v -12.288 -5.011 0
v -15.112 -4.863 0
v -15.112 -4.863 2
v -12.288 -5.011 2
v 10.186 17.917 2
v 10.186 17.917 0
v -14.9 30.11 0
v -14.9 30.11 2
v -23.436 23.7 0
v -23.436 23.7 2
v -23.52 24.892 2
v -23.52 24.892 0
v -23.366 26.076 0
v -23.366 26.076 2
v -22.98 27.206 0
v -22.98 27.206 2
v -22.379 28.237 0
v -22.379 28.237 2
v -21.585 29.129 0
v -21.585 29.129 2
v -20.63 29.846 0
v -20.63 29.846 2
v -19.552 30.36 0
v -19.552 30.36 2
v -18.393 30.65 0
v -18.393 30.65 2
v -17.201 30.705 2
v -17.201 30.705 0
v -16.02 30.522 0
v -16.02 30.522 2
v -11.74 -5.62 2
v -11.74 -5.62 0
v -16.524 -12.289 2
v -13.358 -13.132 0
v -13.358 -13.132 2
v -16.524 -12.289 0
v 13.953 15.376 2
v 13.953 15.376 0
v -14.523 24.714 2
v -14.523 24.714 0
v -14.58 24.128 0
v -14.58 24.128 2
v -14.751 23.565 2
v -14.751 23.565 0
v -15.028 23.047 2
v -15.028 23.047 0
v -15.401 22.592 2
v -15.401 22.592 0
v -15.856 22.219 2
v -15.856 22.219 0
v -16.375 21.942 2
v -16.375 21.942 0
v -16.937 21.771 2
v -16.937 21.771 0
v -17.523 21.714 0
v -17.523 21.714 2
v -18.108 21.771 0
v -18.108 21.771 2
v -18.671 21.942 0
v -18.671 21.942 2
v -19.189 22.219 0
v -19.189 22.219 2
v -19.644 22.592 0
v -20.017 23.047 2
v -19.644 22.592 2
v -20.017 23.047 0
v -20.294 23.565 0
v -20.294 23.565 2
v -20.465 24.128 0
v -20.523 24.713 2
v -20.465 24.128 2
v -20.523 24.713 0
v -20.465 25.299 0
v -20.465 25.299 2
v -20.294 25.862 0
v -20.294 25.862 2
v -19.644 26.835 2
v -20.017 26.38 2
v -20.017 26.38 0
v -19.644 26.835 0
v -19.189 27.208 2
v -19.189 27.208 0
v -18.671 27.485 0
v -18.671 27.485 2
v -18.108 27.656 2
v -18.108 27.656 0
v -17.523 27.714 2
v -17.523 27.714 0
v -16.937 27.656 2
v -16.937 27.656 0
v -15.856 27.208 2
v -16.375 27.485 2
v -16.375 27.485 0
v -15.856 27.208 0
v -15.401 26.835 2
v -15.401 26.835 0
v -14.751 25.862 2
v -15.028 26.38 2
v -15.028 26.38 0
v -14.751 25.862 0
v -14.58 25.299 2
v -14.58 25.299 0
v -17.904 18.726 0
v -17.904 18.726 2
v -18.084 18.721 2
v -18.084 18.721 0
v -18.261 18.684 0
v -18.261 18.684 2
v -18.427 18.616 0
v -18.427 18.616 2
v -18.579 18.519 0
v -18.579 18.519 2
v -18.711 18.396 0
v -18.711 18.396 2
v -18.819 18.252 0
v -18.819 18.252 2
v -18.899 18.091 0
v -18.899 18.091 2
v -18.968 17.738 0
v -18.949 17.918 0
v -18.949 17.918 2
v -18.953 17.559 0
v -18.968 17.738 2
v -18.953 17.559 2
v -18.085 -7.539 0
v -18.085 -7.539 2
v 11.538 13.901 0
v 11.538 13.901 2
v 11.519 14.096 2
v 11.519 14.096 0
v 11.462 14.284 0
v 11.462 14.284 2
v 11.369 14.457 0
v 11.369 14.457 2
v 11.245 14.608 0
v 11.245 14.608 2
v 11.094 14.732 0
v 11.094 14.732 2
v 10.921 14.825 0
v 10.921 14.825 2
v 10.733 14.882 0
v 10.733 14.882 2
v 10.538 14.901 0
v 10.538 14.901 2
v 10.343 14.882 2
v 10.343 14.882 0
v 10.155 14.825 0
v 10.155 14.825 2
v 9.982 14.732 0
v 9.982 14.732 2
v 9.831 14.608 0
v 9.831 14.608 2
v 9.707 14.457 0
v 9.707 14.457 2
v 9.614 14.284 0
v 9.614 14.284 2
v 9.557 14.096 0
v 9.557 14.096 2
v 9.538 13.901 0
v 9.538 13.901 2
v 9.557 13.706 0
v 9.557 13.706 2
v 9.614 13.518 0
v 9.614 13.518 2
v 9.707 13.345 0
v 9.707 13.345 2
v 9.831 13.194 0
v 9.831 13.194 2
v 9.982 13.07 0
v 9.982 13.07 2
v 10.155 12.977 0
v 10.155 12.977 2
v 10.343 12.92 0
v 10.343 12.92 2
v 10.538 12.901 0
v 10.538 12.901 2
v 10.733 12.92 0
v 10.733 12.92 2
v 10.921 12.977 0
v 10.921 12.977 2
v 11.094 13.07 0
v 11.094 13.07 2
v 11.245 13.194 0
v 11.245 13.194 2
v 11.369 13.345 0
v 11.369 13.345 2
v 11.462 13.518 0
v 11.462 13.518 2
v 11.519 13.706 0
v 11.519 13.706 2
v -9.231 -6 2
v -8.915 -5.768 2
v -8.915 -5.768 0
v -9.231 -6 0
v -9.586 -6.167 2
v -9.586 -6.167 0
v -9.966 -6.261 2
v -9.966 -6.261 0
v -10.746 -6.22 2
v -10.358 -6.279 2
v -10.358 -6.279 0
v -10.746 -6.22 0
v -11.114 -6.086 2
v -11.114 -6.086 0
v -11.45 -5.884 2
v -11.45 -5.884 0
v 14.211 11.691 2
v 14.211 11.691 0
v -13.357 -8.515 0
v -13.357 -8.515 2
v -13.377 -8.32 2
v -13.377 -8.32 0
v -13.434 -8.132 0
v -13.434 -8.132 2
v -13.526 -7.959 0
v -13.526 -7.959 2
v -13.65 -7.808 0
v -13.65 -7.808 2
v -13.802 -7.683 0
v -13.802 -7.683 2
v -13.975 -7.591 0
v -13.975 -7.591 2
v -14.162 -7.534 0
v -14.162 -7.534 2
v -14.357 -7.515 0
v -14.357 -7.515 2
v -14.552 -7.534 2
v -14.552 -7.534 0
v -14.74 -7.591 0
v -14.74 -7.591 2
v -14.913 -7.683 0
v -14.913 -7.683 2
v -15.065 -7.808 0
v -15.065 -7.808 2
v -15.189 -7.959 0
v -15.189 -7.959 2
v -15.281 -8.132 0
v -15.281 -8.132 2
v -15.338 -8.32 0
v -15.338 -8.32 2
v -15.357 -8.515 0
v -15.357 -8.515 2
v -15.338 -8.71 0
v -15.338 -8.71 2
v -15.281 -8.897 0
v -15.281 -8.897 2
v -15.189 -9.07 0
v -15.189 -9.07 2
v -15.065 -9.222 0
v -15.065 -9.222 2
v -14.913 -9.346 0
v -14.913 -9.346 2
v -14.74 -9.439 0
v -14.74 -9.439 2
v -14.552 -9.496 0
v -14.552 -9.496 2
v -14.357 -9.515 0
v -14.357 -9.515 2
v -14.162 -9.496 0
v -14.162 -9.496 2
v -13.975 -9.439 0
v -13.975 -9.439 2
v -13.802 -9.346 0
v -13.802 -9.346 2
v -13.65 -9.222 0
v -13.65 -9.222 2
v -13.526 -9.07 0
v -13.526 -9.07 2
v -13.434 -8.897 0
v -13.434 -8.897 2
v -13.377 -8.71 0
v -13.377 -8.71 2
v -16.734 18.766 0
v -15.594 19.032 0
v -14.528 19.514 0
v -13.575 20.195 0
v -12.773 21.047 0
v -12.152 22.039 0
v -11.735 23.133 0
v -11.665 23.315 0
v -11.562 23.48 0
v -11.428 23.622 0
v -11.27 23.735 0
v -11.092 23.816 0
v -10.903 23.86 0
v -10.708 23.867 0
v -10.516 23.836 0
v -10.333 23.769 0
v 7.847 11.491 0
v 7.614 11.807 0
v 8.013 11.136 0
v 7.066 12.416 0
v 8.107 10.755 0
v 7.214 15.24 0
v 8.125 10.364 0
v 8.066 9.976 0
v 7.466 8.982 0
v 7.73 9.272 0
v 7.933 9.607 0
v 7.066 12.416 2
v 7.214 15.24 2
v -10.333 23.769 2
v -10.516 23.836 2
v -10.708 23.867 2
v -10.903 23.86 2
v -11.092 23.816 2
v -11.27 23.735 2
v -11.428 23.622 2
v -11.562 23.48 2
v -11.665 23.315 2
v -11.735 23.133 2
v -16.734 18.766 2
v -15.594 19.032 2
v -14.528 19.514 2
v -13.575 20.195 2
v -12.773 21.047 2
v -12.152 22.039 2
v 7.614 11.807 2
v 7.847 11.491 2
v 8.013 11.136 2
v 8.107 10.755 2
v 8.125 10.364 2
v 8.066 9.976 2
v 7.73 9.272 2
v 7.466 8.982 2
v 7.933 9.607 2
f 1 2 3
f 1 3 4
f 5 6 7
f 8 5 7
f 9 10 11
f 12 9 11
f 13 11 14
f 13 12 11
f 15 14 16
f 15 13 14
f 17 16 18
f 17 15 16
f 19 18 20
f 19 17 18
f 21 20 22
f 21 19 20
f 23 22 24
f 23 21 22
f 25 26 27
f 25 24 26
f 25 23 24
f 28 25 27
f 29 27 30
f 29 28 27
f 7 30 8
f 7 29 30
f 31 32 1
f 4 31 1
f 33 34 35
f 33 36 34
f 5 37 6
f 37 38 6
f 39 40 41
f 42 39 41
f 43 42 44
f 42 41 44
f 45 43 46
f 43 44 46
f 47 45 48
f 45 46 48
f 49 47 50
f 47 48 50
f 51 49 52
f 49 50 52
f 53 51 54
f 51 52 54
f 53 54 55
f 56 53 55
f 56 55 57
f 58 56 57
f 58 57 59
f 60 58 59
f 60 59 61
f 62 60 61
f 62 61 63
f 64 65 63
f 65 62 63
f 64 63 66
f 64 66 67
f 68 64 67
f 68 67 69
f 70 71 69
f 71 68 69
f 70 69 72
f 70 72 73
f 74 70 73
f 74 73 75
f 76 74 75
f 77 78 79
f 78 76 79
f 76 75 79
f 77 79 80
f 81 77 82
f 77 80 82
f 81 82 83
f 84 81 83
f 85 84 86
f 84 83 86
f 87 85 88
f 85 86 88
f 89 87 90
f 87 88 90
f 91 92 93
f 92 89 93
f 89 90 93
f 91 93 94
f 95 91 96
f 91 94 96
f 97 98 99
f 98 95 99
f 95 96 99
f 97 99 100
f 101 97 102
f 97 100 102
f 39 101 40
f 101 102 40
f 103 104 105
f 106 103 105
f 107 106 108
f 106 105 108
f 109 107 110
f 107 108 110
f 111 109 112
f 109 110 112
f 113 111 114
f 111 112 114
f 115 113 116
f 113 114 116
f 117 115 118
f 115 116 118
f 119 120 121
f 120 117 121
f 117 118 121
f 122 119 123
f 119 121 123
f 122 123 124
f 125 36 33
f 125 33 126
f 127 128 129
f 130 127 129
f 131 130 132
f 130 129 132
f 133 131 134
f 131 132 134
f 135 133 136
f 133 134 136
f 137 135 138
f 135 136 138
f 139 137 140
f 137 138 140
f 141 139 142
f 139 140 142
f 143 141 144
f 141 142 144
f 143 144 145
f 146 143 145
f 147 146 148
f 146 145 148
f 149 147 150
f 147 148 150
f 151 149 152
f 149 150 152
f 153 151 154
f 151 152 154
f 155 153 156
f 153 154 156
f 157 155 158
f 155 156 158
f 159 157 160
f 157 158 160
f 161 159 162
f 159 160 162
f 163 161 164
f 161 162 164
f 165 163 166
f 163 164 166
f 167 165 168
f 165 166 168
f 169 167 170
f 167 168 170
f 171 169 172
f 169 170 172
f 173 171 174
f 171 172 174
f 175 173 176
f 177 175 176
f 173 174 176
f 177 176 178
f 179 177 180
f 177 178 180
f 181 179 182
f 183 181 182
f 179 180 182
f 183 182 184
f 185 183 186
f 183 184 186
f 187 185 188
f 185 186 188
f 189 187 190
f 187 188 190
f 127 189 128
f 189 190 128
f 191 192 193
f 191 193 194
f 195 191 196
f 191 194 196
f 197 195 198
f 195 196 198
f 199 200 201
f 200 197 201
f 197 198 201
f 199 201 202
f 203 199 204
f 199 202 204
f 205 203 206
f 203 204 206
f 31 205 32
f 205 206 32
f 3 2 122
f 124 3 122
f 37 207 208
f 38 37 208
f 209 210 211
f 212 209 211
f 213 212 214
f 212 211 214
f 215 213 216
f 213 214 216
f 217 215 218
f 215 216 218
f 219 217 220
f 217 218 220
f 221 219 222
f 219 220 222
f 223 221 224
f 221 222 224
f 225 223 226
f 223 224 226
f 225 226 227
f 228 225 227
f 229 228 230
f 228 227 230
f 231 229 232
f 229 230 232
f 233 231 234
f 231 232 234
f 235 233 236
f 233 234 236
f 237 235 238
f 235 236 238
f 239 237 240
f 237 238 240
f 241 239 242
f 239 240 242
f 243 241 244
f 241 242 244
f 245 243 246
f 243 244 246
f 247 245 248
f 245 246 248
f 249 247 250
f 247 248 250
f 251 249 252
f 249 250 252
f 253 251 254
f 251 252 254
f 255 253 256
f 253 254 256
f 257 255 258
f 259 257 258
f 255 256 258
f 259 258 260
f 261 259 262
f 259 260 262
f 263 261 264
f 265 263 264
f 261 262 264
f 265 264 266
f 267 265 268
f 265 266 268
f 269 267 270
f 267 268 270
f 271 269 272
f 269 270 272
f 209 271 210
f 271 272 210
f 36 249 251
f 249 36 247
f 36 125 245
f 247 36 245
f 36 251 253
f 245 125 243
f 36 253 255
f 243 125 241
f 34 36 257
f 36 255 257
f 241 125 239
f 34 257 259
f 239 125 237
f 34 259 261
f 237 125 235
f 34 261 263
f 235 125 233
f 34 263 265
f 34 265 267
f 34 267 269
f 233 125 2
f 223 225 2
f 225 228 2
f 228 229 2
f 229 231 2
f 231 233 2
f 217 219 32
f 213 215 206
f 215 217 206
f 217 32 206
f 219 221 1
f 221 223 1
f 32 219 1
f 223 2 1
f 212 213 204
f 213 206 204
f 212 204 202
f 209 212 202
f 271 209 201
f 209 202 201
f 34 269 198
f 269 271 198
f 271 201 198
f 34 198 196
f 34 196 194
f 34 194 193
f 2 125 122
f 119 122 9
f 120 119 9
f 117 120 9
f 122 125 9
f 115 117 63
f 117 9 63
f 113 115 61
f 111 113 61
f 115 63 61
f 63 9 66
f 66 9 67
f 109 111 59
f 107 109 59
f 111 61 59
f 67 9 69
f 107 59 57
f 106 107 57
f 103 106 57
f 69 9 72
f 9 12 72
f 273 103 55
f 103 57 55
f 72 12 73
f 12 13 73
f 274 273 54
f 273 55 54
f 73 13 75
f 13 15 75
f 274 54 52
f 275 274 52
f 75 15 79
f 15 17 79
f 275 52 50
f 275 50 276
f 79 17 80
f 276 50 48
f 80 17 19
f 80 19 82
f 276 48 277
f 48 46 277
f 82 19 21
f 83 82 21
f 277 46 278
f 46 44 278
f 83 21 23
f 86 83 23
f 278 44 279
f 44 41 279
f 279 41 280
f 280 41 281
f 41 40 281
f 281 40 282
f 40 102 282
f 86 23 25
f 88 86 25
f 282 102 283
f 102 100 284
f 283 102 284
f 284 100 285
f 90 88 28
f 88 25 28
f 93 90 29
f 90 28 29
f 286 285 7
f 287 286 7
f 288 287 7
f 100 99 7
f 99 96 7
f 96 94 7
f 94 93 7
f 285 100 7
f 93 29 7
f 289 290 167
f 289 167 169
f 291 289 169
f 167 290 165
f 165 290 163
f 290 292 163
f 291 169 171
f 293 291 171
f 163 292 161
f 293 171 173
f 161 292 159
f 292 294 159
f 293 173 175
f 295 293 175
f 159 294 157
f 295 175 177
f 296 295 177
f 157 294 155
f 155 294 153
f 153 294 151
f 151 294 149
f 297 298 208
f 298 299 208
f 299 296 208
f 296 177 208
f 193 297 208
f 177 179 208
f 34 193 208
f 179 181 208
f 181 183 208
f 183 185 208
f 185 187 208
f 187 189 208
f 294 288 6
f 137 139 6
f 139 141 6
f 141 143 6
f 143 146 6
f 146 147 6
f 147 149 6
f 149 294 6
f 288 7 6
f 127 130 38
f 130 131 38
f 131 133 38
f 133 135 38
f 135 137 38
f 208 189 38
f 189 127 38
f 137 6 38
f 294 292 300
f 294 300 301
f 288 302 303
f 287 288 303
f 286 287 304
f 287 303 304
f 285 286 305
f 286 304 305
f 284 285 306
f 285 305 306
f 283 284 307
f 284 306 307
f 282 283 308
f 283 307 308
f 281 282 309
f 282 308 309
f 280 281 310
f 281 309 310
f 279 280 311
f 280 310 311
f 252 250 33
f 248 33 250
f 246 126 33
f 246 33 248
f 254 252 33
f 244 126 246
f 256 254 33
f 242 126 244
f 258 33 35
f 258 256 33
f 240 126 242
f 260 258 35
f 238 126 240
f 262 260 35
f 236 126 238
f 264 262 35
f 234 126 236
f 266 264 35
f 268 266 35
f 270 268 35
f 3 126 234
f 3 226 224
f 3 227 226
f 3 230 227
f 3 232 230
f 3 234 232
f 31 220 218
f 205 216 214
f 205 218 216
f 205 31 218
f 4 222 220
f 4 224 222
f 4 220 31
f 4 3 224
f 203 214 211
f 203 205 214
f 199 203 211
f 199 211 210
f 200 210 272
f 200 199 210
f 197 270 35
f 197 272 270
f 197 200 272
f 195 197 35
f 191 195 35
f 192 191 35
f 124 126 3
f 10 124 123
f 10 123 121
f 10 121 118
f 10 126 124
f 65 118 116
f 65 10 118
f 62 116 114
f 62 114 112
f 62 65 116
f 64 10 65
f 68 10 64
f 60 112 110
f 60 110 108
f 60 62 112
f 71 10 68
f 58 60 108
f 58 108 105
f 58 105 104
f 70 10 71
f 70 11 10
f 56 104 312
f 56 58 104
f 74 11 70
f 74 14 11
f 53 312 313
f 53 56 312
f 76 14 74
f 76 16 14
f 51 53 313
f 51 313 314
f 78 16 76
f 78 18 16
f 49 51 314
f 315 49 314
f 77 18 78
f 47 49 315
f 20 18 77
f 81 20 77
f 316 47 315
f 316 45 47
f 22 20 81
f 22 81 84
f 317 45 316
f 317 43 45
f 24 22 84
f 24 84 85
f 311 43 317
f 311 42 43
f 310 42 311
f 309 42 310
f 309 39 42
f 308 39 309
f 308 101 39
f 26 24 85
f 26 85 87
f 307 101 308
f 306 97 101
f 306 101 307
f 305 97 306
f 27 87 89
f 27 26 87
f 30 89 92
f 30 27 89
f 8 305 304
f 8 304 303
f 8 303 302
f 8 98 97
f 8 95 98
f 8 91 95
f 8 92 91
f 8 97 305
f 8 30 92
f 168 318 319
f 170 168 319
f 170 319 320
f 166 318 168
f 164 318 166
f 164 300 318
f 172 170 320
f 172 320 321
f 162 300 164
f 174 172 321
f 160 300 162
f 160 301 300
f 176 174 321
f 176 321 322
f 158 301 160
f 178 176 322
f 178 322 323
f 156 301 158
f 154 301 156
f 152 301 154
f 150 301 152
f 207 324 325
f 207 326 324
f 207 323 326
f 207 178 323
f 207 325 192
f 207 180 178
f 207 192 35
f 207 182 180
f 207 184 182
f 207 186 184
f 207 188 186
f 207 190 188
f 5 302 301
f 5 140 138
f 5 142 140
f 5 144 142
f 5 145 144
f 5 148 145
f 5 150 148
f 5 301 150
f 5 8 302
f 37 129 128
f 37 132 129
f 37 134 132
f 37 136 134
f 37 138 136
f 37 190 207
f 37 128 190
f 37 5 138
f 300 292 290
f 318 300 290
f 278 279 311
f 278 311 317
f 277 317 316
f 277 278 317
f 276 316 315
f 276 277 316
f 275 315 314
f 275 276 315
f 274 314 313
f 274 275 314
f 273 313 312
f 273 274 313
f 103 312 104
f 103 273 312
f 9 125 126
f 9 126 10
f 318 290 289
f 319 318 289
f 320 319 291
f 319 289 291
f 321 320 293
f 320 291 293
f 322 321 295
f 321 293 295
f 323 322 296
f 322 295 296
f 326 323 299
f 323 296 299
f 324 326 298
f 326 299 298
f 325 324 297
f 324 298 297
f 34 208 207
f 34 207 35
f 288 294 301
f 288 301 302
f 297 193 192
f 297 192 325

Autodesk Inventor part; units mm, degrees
ref_plane "YZ Plane" through (0, 0, 0) normal (1, 0, 0) x (0, 1, 0)
ref_plane "XZ Plane" through (0, 0, 0) normal (0, 1, 0) x (-1, 0, 0)
ref_plane "XY Plane" through (0, 0, 0) normal (0, 0, 1) x (1, 0, 0)
sketch "Sketch1" plane through (0, 0, 0) normal (0, 0, 1) x (1, 0, 0)
  circle A0 centre (10.538, 13.901) radius 1.5 projected
  circle A1 centre (-14.3574, -8.5148) radius 1.5 projected
  line L0 (-15.1125, -4.8626) -> (-12.2879, -5.0107) projected
  line L1 (-15.1125, -4.8626) -> (-18.0851, -7.5392) projected
  line L2 (-15.5871, -15.1392) -> (-18.0851, -7.5392) projected
  line L3 (16.4403, 13.6984) -> (-15.5871, -15.1392) projected
  line L4 (16.4403, 13.6984) -> (10.1865, 17.9166) projected
  line L5 (10.1865, 17.9166) -> (7.2139, 15.2401) projected
  line L6 (7.0659, 12.4156) -> (7.2139, 15.2401) projected
  line L7 (7.0659, 12.4156) -> (7.6141, 11.8066) projected
  arc A2 (7.4661, 8.9821) -> (7.6141, 11.8066) centre (6.1278, 10.4684) ccw projected
  line L8 (-8.9151, -5.7676) -> (7.4661, 8.9821) projected
  arc A3 (-11.7396, -5.6196) -> (-8.9151, -5.7676) centre (-10.2534, -4.2813) ccw projected
  line L9 (-11.7396, -5.6196) -> (-12.2879, -5.0107) projected
  circle A4 centre (-17.5227, 24.7135) radius 1.5 projected
  circle A5 centre (-17.5227, 24.7135) radius 3
  circle A6 centre (-17.5227, 24.7135) radius 6
  line L10 (-18.0851, -7.5392) -> (-23.4365, 23.7005)
  line L11 (10.1865, 17.9166) -> (-14.8998, 30.1099)
  line L12 (-15.1125, -4.8626) -> (-19.1917, 18.9503)
  line L13 (7.2139, 15.2401) -> (-11.5335, 24.3523)
  point P0 (0, 0)
  dimension "d0" = 6
  dimension "d1" = 12
extrude "Extrusion1" add sketch "Sketch1" along normal blind 2 contours L0 L9 A3 L8 A2 L7 L6 L5 L4 L3 L2 L1 | L1 L10 A6 L12 | A6 | A6 L11 L5 L13
chamfer "Chamfer1" distance 3 angle 45 2 edges at (16.4403, 13.6984, 1) (-15.5871, -15.1392, 1)
sketch "Sketch2" plane through (0, 0, 2) normal (0, 0, 1) x (1, 0, 0)
  line L0 (-13.3576, -13.1318) -> (-16.5238, -12.2892) projected
  line L1 (-13.3576, -13.1318) -> (14.2108, 11.691) projected
  line L2 (13.9532, 15.376) -> (14.2108, 11.691) projected
  line L3 (13.9532, 15.376) -> (10.1865, 17.9166) projected
  line L4 (10.1865, 17.9166) -> (-14.8998, 30.1099) projected
  arc A0 (-14.8998, 30.1099) -> (-23.4365, 23.7005) centre (-17.5227, 24.7135) ccw projected
  line L5 (-23.4365, 23.7005) -> (-18.0851, -7.5392) projected
  line L6 (-18.0851, -7.5392) -> (-16.5238, -12.2892) projected
  circle A1 centre (-17.5227, 24.7135) radius 3 projected
  circle A2 centre (10.538, 13.901) radius 1.5 projected
  circle A3 centre (-14.3574, -8.5148) radius 1.5 projected
  line L7 (-15.1125, -4.8626) -> (-19.1917, 18.9503) projected
  arc A4 (-19.1917, 18.9503) -> (-11.5335, 24.3523) centre (-17.5227, 24.7135) ccw projected
  line L8 (-11.5335, 24.3523) -> (7.2139, 15.2401) projected
  line L9 (7.2139, 15.2401) -> (7.0659, 12.4156) projected
  line L10 (7.0659, 12.4156) -> (7.6141, 11.8066) projected
  arc A5 (7.4661, 8.9821) -> (7.6141, 11.8066) centre (6.1278, 10.4684) ccw projected
  line L11 (7.4661, 8.9821) -> (-8.9151, -5.7676) projected
  arc A6 (-11.7396, -5.6196) -> (-8.9151, -5.7676) centre (-10.2534, -4.2813) ccw projected
  line L12 (-11.7396, -5.6196) -> (-12.2879, -5.0107) projected
  line L13 (-12.2879, -5.0107) -> (-15.1125, -4.8626) projected
  circle A7 centre (-14.3574, -8.5148) radius 1.5 projected
  circle A8 centre (-14.3574, -8.5148) radius 1
  circle A9 centre (10.538, 13.901) radius 1
  point P0 (0, 0)
  dimension "d7" = 2
  dimension "d8" = 2
extrude "Extrusion2" add sketch "Sketch2" against normal blind 2 contours A2 | A3
fillet "Fillet1" radius 1 2 edges at (-19.1917, 18.9503, 1) (-11.5335, 24.3523, 1)
properties part number "stand_3"
